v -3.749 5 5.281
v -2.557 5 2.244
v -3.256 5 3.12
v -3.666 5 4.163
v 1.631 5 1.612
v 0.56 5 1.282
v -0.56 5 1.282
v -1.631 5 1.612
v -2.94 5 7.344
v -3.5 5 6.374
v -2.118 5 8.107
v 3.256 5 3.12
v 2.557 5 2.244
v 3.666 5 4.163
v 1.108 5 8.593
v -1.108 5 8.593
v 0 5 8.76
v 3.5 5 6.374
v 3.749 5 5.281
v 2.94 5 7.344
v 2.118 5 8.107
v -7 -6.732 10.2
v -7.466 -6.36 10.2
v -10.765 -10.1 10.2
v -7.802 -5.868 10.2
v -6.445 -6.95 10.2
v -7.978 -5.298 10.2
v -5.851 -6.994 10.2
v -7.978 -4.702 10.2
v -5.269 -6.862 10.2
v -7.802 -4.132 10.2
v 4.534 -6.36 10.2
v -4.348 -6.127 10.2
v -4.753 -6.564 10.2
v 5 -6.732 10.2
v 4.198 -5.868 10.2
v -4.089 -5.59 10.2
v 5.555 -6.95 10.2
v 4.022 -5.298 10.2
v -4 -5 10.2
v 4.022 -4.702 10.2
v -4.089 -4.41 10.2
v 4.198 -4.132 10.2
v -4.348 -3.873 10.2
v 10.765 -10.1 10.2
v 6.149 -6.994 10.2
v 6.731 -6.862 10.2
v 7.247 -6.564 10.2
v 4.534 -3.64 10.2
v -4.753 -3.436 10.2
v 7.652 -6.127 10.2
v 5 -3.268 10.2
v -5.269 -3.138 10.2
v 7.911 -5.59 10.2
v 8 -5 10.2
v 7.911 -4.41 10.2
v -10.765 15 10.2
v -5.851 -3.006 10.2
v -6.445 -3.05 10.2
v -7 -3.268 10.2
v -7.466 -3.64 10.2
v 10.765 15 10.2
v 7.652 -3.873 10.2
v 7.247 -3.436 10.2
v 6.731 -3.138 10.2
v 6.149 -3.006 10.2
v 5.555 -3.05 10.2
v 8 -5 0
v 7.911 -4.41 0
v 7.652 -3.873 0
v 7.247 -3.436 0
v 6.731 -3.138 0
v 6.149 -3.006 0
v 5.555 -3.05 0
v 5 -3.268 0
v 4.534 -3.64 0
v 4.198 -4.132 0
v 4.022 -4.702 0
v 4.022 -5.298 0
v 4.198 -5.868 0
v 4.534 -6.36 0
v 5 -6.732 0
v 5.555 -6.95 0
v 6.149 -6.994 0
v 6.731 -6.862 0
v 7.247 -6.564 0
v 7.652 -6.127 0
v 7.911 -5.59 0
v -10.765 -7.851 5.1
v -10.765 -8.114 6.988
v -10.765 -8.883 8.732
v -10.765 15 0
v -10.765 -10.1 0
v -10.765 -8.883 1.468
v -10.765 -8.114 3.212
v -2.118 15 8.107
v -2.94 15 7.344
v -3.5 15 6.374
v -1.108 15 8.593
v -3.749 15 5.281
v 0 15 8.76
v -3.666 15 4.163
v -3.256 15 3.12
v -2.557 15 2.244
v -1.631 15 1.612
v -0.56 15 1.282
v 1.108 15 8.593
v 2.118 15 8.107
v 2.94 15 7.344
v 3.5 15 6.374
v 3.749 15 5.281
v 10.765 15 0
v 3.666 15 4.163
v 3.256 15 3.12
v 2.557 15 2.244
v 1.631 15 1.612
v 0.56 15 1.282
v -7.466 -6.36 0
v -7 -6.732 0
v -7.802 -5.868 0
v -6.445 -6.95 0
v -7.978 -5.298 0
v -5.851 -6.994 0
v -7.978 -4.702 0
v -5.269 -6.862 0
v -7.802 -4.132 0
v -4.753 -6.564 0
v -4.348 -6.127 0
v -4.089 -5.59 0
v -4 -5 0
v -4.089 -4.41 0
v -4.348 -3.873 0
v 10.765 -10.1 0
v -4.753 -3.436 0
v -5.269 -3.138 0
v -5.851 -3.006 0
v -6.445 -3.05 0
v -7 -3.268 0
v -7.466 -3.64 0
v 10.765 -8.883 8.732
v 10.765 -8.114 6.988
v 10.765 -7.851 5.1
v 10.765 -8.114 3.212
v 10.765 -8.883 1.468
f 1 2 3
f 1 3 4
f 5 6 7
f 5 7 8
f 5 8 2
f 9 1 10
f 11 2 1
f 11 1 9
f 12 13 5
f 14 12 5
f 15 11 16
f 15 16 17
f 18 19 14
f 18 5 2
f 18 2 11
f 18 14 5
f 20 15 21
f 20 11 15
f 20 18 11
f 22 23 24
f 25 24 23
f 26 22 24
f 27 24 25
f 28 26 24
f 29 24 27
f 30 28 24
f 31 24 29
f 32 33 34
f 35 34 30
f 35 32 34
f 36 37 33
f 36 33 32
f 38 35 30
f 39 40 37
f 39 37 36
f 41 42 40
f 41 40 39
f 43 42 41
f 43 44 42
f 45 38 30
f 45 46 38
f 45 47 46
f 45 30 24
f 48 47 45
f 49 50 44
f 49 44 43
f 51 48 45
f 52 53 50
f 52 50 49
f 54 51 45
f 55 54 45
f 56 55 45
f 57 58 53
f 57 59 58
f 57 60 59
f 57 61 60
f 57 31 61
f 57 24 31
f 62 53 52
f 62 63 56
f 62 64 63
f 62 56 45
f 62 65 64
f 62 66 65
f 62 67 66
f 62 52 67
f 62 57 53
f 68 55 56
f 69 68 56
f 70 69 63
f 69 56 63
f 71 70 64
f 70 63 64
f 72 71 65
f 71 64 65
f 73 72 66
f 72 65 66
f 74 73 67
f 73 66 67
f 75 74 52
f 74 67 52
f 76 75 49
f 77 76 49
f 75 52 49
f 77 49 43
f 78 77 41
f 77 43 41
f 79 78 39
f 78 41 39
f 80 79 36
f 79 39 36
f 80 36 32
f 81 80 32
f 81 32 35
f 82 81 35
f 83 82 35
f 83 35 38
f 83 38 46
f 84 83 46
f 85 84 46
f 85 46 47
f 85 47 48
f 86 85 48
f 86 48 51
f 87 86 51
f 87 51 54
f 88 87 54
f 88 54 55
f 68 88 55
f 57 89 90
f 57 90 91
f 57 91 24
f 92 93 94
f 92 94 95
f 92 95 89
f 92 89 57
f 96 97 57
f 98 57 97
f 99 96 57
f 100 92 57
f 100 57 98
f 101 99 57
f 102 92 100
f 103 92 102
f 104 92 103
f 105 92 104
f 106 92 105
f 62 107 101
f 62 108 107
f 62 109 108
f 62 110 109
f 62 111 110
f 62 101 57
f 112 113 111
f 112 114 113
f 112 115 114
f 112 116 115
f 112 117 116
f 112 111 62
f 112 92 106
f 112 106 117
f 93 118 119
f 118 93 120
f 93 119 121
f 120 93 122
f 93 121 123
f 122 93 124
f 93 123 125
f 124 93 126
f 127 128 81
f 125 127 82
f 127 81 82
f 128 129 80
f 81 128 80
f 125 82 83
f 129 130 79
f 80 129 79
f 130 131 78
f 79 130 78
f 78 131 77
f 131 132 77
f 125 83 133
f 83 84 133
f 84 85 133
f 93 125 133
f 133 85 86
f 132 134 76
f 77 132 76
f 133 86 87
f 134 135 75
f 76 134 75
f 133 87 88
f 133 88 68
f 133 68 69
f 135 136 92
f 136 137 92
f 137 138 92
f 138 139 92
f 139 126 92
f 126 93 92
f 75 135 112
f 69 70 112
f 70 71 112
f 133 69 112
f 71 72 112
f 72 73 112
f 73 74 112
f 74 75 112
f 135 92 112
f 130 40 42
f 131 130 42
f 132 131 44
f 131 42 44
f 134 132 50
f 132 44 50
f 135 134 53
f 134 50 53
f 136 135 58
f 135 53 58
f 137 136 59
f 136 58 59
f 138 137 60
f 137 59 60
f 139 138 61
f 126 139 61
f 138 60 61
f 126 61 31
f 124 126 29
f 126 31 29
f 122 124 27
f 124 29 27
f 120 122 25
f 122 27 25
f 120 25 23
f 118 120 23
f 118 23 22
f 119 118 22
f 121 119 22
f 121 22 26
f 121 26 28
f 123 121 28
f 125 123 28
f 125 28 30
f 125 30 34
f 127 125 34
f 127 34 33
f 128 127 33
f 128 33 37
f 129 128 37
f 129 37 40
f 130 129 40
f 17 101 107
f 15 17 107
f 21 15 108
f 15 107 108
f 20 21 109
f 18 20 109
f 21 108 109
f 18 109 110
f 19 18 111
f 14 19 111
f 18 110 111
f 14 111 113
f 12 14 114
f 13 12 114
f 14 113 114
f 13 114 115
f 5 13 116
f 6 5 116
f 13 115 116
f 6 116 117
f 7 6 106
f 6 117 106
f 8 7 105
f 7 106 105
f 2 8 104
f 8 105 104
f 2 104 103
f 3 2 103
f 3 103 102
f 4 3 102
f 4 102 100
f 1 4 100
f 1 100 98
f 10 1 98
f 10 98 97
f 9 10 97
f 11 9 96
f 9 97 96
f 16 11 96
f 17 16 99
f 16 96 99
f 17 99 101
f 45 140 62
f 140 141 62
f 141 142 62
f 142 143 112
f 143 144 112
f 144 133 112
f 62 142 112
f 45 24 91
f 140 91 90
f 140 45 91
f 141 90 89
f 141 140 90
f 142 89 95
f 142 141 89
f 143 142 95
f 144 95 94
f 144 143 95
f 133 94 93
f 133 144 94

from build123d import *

# Parameters (mm, degrees)
SKETCH1_W           = 21.53
SKETCH1_H           = 30
BOSS_EXTRUDE1_DEPTH = 10.2
SKETCH2_R           = 3.76
CUT_EXTRUDE1_DEPTH  = 10
CUT_EXTRUDE2_REACH  = 30.153
SKETCH3_W           = 10.2
SKETCH3_H           = 4.899707594
CUT_EXTRUDE3_REACH  = 23.093
SKETCH4_R           = 2


with BuildPart() as part:
    # Sketch1 → Boss-Extrude1 (new body)
    with BuildSketch(Plane.XY):
        Rectangle(SKETCH1_W, SKETCH1_H)
    extrude(amount=BOSS_EXTRUDE1_DEPTH)

    # Sketch2 → Cut-Extrude1 (cut)
    with BuildSketch(Plane(origin=(0, 15, 0), x_dir=(1, 0, 0), z_dir=(0, 1, 0))):
        with Locations(Location((0, -5, 0), (0, 0, 270))):
            Circle(SKETCH2_R)
    extrude(amount=-CUT_EXTRUDE1_DEPTH, mode=Mode.SUBTRACT)

    # Sketch3 → Cut-Extrude2 (cut, up to next)
    with BuildSketch(Plane(origin=(10.765, 0, 0), x_dir=(0, 0, -1), z_dir=(1, 0, 0)), mode=Mode.PRIVATE) as cut_extrude2_sk1:
        with BuildLine():
            ThreePointArc((-10.2, -10.100292406), (-5.1, -7.850979668), (0, -10.100292406))
            Line((0, -10.100292406), (-10.2, -10.100292406))
        make_face()
    cut_extrude2_tool1 = extrude(cut_extrude2_sk1.sketch, amount=-CUT_EXTRUDE2_REACH, mode=Mode.PRIVATE) & part.part
    # Sketch3 → Cut-Extrude2 (cut, up to next)
    with BuildSketch(Plane(origin=(10.765, 0, 0), x_dir=(0, 0, -1), z_dir=(1, 0, 0)), mode=Mode.PRIVATE) as cut_extrude2_sk2:
        with Locations((-5.1, -12.550146203)):
            Rectangle(SKETCH3_W, SKETCH3_H)
    cut_extrude2_tool2 = extrude(cut_extrude2_sk2.sketch, amount=-CUT_EXTRUDE2_REACH, mode=Mode.PRIVATE) & part.part
    add(cut_extrude2_tool1.solids().sort_by_distance((10.765, -9.186693, 5.1))[0], mode=Mode.SUBTRACT)
    add(cut_extrude2_tool2.solids().sort_by_distance((10.765, -12.550146, 5.1))[0], mode=Mode.SUBTRACT)

    # Sketch4 → Cut-Extrude3 (cut, up to next)
    with BuildSketch(Plane.XY.offset(10.2), mode=Mode.PRIVATE) as cut_extrude3_sk1:
        with Locations((-6, -5)):
            Circle(SKETCH4_R)
    cut_extrude3_tool1 = extrude(cut_extrude3_sk1.sketch, amount=-CUT_EXTRUDE3_REACH, mode=Mode.PRIVATE) & part.part
    # Sketch4 → Cut-Extrude3 (cut, up to next)
    with BuildSketch(Plane.XY.offset(10.2), mode=Mode.PRIVATE) as cut_extrude3_sk2:
        with Locations((6, -5)):
            Circle(SKETCH4_R)
    cut_extrude3_tool2 = extrude(cut_extrude3_sk2.sketch, amount=-CUT_EXTRUDE3_REACH, mode=Mode.PRIVATE) & part.part
    add(cut_extrude3_tool1.solids().sort_by_distance((-6, -5, 10.2))[0], mode=Mode.SUBTRACT)
    add(cut_extrude3_tool2.solids().sort_by_distance((6, -5, 10.2))[0], mode=Mode.SUBTRACT)


solid = part.part
